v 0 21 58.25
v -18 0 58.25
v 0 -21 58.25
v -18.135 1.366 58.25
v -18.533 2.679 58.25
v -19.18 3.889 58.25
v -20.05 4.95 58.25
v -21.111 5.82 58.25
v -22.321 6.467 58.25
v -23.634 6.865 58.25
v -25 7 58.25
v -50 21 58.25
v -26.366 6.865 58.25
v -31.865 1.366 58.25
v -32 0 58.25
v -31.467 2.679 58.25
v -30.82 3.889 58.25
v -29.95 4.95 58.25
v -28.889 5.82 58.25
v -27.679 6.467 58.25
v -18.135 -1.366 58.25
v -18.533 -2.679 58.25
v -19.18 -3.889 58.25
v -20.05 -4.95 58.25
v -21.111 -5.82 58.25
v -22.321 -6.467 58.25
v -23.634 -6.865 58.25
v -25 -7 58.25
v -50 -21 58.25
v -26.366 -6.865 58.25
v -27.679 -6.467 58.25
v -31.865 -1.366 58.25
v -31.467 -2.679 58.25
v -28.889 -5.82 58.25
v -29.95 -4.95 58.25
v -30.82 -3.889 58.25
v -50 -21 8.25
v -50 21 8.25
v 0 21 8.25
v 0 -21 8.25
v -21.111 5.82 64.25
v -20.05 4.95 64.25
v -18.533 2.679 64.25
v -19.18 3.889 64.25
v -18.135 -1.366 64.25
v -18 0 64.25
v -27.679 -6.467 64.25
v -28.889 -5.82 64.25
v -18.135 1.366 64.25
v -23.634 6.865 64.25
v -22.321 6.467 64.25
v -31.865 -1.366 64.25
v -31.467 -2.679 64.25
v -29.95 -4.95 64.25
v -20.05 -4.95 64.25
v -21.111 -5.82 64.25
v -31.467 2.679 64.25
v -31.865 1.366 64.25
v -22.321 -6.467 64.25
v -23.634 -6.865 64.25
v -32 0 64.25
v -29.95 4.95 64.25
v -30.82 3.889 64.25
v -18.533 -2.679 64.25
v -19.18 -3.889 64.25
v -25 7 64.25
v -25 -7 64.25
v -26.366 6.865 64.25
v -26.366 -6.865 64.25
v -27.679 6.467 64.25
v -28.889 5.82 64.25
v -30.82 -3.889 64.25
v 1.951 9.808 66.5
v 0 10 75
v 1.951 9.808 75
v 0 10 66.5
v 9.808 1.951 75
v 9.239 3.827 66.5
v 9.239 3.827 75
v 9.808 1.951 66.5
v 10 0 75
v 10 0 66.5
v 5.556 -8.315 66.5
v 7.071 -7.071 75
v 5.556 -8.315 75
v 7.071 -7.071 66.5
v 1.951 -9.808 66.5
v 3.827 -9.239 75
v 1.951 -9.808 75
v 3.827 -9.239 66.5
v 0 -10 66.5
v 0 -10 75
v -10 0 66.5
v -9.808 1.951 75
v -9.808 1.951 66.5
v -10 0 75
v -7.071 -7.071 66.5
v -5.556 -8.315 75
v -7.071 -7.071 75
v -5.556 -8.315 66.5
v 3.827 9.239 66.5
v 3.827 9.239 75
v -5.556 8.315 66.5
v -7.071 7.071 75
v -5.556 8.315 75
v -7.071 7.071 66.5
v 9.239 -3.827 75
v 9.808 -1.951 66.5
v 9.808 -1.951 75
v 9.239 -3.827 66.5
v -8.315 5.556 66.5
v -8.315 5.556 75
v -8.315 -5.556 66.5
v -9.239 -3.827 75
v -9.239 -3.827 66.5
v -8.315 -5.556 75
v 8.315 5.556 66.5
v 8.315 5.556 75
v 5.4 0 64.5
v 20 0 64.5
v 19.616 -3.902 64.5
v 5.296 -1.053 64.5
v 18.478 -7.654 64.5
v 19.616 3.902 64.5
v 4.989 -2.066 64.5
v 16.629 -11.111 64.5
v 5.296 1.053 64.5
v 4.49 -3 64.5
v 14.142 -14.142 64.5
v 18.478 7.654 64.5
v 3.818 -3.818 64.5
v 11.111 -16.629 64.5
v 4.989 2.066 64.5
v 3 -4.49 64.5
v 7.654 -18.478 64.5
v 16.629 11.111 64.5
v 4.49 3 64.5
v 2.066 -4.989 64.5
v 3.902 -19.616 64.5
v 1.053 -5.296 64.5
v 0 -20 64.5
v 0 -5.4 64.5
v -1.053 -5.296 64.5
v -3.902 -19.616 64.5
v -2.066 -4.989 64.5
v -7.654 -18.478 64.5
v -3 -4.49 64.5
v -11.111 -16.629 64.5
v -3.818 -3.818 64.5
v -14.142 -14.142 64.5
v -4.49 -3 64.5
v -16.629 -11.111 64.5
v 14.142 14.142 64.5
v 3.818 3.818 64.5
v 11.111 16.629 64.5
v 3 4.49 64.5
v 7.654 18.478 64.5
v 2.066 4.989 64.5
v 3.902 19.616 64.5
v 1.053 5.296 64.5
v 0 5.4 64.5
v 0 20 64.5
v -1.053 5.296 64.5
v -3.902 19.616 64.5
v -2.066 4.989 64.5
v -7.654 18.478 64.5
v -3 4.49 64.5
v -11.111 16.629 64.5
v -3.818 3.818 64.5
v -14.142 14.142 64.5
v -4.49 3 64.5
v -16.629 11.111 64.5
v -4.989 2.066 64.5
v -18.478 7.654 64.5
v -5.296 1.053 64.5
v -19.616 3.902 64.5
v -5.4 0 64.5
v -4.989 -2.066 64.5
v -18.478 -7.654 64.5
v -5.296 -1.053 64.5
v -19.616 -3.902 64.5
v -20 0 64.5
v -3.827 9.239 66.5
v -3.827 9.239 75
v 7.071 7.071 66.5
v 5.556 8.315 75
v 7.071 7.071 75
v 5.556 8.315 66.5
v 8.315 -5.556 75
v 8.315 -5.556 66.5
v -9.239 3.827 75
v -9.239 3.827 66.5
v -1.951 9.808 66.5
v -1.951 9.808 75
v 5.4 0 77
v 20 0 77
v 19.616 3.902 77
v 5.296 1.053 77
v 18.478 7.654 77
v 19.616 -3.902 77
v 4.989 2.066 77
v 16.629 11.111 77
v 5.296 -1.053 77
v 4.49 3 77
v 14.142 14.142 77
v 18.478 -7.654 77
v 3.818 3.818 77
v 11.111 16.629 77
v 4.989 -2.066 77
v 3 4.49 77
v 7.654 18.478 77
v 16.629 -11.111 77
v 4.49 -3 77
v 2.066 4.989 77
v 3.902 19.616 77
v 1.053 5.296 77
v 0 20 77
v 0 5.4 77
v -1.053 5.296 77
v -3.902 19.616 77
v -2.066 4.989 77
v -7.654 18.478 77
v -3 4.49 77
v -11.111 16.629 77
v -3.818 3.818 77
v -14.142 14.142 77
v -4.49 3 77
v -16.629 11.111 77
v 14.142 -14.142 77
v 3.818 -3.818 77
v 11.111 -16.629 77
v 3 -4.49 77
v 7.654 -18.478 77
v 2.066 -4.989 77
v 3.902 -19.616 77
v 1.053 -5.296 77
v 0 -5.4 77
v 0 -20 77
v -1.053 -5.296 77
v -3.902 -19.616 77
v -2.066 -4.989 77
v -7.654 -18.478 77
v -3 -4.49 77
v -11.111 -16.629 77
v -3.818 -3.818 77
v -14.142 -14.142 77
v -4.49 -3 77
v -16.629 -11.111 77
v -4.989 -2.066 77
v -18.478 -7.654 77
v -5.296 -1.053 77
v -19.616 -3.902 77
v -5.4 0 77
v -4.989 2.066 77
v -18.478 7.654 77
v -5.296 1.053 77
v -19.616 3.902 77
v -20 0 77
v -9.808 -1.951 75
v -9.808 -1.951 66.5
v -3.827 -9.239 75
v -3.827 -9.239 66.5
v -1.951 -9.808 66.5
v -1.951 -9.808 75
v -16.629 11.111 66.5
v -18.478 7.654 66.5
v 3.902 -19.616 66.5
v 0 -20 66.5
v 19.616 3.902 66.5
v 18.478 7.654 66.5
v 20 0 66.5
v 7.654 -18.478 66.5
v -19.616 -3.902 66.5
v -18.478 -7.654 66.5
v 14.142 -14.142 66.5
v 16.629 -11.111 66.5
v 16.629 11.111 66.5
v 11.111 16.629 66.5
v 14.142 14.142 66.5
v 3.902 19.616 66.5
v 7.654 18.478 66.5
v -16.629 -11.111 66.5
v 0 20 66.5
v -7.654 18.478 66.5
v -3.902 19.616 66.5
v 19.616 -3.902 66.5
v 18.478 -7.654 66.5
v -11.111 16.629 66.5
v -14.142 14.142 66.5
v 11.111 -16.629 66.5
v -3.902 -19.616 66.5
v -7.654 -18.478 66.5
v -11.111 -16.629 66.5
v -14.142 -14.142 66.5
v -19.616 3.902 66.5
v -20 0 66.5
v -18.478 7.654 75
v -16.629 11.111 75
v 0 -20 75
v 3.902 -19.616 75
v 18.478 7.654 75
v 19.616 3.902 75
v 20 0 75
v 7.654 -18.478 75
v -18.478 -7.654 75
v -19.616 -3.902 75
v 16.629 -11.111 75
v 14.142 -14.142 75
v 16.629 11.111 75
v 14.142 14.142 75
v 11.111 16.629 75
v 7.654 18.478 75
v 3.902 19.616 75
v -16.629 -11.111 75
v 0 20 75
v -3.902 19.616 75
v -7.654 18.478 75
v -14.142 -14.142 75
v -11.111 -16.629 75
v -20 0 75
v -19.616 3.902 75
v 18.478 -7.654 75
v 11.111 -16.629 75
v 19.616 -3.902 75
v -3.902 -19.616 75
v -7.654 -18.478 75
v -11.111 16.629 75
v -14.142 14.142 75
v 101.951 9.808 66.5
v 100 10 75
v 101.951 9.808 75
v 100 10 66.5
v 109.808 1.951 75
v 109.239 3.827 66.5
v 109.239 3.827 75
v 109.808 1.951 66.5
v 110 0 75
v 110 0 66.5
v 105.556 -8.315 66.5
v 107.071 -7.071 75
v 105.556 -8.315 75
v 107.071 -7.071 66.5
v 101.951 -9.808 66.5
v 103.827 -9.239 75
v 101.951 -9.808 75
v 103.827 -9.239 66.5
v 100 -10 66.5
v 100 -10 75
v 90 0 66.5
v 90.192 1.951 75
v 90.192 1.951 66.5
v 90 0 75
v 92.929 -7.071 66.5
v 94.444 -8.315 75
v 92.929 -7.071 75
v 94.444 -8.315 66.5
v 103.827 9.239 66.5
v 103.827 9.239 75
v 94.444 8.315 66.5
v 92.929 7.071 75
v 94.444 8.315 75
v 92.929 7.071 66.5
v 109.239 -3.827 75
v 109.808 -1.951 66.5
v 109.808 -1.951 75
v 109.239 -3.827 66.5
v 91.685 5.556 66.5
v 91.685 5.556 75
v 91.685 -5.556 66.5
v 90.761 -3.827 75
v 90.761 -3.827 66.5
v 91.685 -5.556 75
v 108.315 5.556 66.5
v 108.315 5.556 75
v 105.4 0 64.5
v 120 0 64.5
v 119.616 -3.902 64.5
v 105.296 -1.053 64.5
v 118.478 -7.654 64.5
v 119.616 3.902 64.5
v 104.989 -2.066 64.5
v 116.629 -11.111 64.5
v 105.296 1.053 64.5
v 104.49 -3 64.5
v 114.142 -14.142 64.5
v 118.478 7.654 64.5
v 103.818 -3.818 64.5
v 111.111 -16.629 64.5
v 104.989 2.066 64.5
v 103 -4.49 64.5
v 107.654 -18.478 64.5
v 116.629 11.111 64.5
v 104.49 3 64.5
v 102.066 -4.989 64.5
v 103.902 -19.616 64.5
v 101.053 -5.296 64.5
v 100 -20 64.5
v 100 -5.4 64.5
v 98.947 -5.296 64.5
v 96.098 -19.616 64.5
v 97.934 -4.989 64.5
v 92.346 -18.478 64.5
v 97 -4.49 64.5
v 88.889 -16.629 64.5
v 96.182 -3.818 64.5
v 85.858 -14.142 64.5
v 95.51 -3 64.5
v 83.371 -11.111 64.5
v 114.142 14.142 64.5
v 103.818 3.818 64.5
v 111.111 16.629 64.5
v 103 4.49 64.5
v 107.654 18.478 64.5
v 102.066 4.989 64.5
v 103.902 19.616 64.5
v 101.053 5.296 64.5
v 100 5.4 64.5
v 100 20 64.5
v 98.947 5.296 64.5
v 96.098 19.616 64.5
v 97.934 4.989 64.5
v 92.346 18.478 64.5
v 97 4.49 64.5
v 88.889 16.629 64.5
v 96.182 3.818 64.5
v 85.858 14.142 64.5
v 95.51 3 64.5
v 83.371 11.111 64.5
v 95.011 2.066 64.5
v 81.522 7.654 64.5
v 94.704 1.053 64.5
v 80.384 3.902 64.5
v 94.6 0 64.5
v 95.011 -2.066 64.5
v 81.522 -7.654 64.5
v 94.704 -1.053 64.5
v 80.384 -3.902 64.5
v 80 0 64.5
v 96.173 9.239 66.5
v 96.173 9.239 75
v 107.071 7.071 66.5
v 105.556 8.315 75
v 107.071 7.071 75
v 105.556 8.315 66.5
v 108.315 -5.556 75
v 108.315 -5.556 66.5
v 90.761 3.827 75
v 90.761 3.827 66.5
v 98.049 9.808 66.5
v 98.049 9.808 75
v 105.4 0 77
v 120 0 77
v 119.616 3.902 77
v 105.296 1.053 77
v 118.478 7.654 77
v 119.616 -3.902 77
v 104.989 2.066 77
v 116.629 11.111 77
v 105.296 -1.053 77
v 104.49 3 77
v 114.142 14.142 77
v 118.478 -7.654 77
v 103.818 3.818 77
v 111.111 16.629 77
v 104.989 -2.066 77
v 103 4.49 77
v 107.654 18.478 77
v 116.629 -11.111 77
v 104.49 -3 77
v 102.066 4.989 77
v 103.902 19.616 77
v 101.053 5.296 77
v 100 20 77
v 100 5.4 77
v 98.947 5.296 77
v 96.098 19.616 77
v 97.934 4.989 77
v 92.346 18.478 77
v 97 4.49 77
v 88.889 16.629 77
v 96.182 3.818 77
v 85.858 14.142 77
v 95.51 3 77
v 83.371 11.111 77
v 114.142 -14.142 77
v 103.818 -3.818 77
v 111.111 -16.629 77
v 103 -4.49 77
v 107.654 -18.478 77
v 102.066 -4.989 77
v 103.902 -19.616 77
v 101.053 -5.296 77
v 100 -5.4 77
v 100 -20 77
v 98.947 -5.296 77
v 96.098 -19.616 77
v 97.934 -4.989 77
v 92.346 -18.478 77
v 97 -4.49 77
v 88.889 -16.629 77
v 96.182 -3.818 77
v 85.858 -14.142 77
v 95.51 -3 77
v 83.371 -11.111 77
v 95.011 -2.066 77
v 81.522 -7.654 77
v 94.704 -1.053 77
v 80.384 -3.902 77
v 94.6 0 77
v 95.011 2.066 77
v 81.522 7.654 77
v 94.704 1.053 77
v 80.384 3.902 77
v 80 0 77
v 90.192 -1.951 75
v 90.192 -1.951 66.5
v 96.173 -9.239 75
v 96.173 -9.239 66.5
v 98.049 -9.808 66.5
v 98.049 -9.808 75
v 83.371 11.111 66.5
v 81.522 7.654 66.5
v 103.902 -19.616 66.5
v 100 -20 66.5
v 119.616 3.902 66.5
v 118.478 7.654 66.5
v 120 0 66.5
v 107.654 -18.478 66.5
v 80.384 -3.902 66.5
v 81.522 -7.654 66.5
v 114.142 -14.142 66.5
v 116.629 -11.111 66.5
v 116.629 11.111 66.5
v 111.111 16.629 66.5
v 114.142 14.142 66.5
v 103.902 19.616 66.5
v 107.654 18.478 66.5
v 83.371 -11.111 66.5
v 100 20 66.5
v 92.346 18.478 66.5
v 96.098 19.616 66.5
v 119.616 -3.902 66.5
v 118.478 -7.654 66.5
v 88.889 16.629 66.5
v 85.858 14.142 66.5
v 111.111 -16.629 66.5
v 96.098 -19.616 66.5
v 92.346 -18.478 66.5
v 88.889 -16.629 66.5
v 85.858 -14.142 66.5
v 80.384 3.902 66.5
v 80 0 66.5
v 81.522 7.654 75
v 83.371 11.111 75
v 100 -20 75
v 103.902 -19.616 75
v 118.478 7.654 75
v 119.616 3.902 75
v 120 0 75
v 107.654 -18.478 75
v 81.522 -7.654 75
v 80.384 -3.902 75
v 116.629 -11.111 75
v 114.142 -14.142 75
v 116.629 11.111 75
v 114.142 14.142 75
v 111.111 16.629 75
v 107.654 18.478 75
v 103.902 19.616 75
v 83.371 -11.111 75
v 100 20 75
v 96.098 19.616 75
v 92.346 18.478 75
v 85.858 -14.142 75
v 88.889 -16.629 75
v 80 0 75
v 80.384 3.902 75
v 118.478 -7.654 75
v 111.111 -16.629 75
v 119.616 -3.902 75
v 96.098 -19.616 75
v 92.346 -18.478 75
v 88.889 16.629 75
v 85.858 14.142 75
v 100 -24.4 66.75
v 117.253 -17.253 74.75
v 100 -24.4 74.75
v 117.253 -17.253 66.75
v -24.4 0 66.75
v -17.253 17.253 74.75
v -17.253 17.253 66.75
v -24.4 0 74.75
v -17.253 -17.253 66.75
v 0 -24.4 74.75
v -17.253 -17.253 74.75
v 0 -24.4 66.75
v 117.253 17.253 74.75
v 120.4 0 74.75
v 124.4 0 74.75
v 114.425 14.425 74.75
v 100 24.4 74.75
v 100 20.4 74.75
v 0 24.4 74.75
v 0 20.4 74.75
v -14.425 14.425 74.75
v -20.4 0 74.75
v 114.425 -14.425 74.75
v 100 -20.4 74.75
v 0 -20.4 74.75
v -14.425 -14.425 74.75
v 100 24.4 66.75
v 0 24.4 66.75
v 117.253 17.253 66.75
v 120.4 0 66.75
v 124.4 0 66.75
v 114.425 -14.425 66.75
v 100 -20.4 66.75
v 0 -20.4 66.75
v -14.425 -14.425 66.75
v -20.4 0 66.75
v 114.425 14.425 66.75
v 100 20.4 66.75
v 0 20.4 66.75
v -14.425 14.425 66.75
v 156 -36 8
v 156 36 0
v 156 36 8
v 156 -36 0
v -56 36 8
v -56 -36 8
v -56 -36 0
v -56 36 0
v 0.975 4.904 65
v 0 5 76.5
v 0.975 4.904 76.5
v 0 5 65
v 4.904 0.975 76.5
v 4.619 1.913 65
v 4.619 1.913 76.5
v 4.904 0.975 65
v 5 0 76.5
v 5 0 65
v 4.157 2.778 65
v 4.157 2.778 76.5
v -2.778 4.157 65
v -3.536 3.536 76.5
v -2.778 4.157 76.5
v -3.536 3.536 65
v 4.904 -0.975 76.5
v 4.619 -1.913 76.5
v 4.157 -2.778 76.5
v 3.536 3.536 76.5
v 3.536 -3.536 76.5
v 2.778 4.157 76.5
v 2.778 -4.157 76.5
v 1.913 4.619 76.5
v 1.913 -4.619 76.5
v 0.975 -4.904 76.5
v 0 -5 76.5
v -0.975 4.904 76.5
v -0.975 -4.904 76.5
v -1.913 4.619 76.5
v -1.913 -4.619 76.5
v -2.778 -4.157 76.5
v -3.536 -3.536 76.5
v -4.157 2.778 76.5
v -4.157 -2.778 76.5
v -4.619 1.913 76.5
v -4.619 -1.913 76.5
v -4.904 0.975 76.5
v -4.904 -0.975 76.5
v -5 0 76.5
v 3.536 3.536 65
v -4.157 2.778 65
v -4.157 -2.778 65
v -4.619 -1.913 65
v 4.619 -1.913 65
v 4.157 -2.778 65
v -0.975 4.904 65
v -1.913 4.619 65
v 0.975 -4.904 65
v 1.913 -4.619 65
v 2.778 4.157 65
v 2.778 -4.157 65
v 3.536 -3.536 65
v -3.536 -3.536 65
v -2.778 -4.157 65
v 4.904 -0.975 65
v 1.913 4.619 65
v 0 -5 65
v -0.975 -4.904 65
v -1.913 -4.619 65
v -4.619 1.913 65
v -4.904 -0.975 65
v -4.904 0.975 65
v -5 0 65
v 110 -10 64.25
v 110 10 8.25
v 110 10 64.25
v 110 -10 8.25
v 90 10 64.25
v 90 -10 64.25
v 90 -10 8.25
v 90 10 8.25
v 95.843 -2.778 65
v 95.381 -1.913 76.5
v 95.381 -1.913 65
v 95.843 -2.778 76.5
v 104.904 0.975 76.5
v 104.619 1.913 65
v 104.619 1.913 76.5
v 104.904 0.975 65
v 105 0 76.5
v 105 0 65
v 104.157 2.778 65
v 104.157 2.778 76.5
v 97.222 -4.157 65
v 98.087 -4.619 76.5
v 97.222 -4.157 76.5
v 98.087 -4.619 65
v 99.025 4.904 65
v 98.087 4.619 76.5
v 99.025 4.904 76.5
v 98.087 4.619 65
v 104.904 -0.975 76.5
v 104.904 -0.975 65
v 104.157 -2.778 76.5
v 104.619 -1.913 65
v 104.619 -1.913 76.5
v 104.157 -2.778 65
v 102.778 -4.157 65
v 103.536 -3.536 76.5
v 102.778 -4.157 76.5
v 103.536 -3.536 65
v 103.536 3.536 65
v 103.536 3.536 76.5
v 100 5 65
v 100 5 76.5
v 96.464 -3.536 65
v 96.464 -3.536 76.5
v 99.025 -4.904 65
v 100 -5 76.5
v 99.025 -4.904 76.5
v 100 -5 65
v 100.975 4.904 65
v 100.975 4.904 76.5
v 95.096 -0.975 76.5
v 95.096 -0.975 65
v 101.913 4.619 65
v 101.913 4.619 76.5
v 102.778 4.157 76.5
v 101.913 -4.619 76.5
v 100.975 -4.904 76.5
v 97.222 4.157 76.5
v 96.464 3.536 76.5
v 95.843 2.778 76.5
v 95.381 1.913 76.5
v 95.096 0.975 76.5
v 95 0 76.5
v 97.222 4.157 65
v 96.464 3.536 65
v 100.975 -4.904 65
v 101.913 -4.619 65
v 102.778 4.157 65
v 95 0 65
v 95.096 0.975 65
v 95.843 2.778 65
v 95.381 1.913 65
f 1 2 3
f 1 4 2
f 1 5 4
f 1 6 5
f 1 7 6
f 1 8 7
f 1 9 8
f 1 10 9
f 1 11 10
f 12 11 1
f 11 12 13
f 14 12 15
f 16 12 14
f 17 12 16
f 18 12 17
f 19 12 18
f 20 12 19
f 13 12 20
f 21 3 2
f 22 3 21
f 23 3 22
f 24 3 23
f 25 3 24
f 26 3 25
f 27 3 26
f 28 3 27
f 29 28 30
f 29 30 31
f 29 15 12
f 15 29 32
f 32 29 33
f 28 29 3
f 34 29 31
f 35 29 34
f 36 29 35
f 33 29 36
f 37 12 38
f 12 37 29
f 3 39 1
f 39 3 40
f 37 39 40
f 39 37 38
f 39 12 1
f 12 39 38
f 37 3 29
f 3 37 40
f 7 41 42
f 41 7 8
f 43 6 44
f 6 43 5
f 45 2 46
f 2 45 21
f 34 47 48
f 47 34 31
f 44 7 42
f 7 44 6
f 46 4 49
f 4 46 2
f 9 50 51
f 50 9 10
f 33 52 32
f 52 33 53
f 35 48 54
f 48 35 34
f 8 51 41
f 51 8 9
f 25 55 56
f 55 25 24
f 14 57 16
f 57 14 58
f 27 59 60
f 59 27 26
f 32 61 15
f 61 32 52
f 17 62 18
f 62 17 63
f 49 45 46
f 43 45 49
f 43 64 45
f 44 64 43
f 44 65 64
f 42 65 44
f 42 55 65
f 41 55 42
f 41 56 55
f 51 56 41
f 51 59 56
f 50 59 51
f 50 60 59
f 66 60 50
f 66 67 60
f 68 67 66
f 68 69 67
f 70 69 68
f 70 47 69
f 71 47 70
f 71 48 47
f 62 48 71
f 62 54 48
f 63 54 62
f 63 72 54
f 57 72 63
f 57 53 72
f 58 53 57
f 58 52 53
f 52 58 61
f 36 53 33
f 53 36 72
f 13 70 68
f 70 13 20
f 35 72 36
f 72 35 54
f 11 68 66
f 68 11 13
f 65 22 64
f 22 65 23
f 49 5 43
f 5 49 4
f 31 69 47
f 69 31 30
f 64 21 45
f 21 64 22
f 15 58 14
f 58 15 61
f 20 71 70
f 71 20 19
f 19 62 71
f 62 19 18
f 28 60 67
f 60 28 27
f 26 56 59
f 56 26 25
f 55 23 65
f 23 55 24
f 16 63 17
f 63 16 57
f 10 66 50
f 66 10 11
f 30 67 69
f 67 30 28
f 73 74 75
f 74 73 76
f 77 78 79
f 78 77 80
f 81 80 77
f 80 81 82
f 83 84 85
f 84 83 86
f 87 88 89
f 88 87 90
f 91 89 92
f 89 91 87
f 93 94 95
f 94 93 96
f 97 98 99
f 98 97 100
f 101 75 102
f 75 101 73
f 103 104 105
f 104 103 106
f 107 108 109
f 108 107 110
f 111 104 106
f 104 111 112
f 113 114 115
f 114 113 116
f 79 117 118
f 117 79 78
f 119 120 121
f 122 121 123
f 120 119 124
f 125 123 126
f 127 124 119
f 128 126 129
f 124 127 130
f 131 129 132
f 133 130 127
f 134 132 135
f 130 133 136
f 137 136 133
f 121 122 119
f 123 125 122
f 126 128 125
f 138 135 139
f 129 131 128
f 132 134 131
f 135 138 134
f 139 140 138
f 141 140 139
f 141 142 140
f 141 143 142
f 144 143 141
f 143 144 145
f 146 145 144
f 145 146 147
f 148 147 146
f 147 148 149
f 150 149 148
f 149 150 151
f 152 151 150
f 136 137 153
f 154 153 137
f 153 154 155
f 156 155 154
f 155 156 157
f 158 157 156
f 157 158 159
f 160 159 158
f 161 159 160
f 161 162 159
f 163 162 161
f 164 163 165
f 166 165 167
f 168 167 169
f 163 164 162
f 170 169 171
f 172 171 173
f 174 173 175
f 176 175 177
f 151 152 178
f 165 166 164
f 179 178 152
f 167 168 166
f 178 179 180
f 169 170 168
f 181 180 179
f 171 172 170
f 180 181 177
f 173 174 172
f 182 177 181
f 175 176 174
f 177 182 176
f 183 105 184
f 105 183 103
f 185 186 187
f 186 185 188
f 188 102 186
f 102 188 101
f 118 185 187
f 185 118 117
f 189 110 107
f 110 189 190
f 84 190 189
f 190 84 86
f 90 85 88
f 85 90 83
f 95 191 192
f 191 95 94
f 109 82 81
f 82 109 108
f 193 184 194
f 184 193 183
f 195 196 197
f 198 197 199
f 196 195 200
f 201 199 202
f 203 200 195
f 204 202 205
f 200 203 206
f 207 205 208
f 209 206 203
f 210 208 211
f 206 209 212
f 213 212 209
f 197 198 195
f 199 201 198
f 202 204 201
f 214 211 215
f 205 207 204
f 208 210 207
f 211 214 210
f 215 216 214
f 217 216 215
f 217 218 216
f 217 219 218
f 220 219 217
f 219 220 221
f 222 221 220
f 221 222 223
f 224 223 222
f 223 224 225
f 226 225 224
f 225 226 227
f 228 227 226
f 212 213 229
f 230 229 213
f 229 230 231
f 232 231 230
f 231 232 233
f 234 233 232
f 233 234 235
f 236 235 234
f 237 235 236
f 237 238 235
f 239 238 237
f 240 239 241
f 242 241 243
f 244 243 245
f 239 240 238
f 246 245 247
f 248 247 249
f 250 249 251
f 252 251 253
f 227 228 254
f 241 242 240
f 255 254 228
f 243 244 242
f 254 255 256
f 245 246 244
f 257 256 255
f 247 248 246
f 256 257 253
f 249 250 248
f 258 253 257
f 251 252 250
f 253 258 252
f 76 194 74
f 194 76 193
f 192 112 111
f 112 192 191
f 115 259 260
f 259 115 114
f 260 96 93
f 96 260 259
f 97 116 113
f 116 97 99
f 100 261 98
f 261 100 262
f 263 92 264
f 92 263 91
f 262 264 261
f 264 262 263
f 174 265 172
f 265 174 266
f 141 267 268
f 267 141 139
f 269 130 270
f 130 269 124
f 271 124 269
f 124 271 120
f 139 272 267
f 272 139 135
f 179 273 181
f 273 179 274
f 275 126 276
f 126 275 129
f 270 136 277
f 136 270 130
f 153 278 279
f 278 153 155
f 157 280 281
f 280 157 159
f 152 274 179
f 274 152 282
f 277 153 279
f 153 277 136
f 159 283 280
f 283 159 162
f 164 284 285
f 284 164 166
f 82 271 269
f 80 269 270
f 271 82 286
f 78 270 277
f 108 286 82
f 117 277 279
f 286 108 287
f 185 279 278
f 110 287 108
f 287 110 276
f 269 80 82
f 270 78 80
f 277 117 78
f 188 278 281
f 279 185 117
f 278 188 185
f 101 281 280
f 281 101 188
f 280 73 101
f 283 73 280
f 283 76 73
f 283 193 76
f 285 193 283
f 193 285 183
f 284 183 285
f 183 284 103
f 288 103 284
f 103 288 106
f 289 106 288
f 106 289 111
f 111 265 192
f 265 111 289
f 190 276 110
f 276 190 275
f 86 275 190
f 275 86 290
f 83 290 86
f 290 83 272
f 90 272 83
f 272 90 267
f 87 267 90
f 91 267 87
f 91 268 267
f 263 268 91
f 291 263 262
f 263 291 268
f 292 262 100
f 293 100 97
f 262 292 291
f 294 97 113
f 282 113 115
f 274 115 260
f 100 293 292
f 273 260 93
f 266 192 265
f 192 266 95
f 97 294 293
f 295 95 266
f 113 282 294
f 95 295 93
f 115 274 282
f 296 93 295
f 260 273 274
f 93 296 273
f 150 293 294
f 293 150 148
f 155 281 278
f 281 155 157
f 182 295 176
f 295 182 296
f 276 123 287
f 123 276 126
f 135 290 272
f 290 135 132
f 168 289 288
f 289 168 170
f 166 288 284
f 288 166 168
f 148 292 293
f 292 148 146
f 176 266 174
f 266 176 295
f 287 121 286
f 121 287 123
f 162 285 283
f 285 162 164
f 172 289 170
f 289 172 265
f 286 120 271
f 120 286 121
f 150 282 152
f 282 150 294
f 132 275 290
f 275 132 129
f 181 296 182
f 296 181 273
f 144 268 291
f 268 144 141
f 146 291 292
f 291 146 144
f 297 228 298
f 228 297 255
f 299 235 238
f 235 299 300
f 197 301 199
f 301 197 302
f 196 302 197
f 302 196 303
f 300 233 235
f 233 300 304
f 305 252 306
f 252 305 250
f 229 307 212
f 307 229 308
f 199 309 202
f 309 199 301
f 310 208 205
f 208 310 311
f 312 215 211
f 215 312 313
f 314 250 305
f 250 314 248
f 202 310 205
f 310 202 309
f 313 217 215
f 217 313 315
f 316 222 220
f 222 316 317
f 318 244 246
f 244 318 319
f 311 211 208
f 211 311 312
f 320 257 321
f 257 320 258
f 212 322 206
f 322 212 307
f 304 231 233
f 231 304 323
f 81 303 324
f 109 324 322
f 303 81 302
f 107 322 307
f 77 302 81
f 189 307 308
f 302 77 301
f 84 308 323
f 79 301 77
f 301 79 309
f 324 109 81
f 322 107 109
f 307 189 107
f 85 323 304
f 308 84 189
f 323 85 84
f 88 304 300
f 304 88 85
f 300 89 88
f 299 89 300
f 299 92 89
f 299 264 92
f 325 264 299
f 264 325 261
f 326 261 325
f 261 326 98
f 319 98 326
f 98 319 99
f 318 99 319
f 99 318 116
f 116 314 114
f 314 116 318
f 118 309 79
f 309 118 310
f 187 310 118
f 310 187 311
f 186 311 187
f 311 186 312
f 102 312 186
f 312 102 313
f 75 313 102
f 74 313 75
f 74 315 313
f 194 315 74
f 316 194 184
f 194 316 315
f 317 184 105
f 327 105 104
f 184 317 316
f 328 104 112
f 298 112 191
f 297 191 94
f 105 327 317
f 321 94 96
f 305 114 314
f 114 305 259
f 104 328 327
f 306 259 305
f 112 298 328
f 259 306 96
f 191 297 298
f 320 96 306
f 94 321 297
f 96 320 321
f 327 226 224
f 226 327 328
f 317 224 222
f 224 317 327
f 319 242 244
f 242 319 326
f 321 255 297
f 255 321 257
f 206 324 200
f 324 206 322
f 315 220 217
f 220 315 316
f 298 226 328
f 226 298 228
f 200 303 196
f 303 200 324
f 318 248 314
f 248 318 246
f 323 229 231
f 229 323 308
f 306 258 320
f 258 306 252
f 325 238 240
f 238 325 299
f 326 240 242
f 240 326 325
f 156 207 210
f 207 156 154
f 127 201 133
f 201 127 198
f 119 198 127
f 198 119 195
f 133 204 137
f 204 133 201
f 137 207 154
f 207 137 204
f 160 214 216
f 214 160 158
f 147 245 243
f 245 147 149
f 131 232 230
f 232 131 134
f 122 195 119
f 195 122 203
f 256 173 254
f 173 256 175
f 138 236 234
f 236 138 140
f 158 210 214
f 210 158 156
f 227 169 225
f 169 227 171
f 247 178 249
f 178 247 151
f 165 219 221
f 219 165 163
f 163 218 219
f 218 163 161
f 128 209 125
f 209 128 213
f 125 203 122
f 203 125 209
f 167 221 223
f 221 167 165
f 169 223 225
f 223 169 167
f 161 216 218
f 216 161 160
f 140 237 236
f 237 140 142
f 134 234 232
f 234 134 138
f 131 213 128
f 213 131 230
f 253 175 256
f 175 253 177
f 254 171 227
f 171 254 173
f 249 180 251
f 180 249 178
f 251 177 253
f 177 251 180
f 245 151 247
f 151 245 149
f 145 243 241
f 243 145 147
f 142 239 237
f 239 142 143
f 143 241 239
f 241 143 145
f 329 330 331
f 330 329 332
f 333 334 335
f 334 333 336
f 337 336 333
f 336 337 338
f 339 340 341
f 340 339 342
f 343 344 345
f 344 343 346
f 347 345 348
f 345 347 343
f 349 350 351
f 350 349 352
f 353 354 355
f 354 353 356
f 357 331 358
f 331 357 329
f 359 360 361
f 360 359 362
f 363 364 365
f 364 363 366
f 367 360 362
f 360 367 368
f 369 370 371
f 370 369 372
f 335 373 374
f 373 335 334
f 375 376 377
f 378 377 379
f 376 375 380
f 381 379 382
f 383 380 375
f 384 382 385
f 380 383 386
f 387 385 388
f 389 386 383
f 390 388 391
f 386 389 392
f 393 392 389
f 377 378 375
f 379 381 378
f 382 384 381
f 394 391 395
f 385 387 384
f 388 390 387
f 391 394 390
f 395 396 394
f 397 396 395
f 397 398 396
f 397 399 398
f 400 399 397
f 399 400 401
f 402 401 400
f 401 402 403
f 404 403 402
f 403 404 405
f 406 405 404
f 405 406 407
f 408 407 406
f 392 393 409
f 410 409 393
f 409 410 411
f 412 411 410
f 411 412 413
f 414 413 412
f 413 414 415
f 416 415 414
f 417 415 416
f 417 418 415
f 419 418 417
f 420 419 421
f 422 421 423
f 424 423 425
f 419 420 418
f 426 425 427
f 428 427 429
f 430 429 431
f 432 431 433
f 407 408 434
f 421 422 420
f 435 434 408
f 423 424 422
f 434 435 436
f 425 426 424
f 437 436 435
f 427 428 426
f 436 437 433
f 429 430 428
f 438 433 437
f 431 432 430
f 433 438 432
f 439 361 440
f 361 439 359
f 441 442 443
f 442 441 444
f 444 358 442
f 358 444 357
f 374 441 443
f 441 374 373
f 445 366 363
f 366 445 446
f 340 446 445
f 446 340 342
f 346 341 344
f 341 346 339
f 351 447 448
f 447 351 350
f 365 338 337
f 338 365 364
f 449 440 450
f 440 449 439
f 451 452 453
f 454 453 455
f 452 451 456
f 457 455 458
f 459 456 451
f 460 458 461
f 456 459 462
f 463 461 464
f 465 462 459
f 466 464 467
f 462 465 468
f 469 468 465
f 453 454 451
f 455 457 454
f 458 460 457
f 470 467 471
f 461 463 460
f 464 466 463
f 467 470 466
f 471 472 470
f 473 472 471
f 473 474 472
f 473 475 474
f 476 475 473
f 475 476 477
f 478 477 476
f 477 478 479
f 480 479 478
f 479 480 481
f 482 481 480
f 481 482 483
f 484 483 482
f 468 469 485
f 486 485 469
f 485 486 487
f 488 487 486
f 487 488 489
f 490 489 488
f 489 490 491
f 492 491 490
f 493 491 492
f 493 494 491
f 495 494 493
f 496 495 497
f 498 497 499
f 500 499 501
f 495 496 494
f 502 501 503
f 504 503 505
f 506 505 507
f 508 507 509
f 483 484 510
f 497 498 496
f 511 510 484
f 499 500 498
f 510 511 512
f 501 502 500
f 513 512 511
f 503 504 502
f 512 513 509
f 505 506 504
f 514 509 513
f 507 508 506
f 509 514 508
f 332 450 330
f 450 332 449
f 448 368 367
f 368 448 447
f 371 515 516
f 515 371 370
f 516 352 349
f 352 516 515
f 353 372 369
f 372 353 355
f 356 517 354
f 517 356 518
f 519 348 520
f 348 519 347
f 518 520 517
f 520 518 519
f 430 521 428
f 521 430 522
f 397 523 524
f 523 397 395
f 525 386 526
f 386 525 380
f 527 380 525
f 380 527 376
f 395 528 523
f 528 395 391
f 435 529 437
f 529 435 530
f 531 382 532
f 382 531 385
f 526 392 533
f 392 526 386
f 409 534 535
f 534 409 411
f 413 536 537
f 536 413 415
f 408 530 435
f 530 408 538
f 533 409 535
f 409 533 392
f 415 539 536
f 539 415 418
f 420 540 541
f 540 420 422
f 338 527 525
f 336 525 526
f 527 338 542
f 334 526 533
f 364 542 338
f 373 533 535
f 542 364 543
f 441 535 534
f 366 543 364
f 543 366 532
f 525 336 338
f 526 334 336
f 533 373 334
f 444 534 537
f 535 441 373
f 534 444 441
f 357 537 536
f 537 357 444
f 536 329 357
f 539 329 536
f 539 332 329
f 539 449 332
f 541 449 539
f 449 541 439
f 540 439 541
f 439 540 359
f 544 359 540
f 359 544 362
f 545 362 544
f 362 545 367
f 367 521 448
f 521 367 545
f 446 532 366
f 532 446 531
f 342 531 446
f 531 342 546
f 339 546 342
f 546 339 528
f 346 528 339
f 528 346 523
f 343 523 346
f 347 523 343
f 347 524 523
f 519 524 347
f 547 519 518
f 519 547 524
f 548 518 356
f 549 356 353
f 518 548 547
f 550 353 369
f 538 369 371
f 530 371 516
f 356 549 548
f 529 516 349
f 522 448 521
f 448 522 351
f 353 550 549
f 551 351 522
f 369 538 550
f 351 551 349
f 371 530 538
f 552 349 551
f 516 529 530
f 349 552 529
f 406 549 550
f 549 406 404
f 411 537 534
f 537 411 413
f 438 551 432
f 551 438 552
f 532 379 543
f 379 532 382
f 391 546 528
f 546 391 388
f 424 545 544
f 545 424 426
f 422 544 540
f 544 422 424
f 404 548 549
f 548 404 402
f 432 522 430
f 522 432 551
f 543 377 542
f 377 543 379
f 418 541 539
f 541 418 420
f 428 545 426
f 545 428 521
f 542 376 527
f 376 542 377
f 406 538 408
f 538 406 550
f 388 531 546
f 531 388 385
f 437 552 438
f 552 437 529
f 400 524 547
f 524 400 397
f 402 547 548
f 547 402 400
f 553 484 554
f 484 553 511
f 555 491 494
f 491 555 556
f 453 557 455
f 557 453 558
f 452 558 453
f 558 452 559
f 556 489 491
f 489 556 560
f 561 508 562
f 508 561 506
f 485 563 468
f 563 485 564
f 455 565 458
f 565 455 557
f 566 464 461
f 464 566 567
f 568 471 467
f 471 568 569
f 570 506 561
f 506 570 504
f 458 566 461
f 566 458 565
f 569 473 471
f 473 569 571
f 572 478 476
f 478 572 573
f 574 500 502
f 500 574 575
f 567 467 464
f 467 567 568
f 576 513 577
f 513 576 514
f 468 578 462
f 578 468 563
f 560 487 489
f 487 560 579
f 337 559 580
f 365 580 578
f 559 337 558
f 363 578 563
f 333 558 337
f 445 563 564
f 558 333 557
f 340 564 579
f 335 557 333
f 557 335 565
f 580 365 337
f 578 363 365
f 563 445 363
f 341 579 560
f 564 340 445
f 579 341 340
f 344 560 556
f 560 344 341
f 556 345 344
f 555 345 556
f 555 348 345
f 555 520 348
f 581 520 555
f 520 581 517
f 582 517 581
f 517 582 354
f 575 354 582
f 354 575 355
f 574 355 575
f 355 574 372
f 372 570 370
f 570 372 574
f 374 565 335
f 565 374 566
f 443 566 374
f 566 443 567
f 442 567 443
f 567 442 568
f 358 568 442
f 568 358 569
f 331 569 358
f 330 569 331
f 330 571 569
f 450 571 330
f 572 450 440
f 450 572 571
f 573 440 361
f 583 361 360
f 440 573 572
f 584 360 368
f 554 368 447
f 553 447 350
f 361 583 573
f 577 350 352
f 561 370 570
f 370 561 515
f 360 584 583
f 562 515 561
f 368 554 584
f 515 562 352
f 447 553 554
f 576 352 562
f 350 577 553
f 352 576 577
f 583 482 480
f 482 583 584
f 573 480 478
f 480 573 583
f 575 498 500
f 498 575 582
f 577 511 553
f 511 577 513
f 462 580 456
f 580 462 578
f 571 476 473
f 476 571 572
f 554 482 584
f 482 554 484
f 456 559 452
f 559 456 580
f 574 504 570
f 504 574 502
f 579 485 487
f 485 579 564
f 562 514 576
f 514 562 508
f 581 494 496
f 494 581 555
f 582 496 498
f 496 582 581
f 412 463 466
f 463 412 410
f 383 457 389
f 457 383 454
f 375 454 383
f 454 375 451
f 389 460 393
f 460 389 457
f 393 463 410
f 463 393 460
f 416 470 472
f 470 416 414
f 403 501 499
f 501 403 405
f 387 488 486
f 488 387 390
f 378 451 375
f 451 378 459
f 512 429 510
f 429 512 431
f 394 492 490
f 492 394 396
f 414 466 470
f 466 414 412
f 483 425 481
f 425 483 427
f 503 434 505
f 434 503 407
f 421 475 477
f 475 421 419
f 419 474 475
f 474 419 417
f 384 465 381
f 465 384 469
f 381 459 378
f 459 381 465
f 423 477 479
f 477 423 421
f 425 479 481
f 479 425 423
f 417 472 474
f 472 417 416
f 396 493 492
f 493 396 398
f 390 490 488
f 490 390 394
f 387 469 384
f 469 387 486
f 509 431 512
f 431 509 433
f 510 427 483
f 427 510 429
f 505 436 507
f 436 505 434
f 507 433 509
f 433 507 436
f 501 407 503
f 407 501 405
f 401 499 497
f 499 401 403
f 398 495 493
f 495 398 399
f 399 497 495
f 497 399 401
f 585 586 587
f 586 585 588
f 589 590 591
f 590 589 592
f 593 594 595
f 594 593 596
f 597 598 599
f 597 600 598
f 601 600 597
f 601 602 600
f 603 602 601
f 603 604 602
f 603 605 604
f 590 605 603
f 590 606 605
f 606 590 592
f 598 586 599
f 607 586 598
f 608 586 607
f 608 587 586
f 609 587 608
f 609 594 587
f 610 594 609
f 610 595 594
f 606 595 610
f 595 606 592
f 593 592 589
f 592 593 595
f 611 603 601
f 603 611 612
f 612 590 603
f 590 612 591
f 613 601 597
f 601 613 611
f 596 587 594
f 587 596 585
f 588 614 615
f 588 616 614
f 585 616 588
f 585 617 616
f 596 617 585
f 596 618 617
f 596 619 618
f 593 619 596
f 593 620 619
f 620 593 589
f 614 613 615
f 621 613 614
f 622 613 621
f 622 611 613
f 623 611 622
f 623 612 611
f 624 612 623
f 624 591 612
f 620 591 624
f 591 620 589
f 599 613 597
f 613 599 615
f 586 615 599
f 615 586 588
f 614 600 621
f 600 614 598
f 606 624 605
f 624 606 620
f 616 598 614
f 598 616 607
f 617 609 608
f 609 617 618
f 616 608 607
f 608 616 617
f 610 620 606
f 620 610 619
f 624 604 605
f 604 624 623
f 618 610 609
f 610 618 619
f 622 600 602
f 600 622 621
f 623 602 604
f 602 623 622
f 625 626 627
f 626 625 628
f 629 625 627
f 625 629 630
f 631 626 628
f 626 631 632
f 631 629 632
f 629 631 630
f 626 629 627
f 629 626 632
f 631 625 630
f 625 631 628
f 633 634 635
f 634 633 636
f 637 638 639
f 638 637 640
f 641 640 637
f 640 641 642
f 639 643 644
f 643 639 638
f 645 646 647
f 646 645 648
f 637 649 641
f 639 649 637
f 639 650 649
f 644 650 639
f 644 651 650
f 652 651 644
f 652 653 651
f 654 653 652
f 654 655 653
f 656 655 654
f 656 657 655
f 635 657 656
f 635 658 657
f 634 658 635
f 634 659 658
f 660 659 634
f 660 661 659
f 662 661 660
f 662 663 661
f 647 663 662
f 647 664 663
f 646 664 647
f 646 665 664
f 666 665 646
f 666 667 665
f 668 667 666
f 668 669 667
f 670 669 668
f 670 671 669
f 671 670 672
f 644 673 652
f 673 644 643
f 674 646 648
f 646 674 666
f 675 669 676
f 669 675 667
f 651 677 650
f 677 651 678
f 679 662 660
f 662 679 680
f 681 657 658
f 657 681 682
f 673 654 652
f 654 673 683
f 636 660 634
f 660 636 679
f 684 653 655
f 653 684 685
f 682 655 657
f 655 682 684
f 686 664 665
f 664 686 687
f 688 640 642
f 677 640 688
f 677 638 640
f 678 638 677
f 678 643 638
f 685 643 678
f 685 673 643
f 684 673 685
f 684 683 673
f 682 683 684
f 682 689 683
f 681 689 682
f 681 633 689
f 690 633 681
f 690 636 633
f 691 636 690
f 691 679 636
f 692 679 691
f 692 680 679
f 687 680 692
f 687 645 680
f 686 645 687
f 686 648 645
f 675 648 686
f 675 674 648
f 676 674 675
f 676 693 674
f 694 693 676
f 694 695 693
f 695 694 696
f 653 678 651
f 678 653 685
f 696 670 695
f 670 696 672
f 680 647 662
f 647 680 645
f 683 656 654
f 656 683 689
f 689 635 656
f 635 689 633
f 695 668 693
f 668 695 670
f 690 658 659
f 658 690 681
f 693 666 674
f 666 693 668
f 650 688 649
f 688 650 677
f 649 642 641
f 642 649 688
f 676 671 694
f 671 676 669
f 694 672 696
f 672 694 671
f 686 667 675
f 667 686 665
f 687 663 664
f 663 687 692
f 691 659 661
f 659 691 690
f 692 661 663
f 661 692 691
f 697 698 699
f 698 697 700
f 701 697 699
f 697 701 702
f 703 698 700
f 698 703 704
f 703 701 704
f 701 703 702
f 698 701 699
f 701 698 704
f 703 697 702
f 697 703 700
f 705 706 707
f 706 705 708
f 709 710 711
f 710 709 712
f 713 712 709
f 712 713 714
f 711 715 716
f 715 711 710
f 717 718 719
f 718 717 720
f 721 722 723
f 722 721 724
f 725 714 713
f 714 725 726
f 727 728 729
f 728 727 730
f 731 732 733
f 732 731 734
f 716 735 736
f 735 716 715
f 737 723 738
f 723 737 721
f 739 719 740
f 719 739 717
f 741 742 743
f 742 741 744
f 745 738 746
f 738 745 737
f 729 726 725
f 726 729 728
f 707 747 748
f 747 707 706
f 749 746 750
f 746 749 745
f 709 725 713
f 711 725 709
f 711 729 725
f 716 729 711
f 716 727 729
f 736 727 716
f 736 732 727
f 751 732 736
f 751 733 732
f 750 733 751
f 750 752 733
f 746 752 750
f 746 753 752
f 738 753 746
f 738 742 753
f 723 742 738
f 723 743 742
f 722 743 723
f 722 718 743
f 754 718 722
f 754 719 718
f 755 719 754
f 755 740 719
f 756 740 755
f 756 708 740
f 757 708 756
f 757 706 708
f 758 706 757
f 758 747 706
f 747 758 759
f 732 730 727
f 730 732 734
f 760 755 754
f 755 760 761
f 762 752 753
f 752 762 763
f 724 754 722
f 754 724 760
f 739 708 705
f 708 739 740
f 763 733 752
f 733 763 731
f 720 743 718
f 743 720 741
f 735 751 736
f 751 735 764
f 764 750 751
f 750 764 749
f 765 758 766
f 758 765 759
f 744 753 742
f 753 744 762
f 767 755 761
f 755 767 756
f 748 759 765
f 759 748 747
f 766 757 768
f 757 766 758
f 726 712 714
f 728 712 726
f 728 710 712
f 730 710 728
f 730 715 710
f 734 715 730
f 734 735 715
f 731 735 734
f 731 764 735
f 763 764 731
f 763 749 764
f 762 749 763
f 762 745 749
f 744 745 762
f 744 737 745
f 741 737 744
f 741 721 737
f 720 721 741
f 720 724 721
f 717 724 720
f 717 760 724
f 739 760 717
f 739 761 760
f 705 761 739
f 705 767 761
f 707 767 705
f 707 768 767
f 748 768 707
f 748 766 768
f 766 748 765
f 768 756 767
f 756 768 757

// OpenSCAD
$fn = 32;

// ------------------------------------------------------------------------
// Motor belt drive: span 100 mm, pulleys d40, belt 8 mm wide
// Every part is its own module, assembly() places every instance.
// ------------------------------------------------------------------------

// --- part 1 ---
module base_plate() {
  difference() {
    translate([-106, -36, 0]) cube([212, 72, 8]);
  }
}

// --- part 2 ---
module motor() {
  union() {
    translate([-25, -21, 0]) cube([50, 42, 50]);
    translate([28, 0, 25]) rotate([0, 90, 0]) cylinder(h = 6, d = 14, center = true);
  }
}

// --- part 3 ---
module drive_shaft() {
  translate([0, 0, -5.75]) cylinder(h = 11.5, d = 10);
}

// --- part 4 ---
module pulley_drive() {
  difference() {
    union() {
      cylinder(h = 12.5, d = 20);
      cylinder(h = 2, d = 40);
      translate([0, 0, 10.5]) cylinder(h = 2, d = 40);
    }
    translate([0, 0, -1]) cylinder(h = 14.5, d = 10.8);
  }
}

// --- part 5 ---
module idler_post() {
  translate([-10, -10, 0]) cube([20, 20, 56]);
}

// --- part 6 ---
module driven_shaft() {
  translate([0, 0, -5.75]) cylinder(h = 11.5, d = 10);
}

// --- part 7 ---
module pulley_driven() {
  difference() {
    union() {
      cylinder(h = 12.5, d = 20);
      cylinder(h = 2, d = 40);
      translate([0, 0, 10.5]) cylinder(h = 2, d = 40);
    }
    translate([0, 0, -1]) cylinder(h = 14.5, d = 10.8);
  }
}

// --- part 8 ---
module drive_belt() {
  difference() {
    linear_extrude(height = 8) polygon(points = concat([for (a = [90 : 45 : 270]) [24.4 * cos(a), 24.4 * sin(a)]], [for (a = [270 : 45 : 450]) [100 + 24.4 * cos(a), 24.4 * sin(a)]]));
    translate([0, 0, -1]) linear_extrude(height = 10) polygon(points = concat([for (a = [90 : 45 : 270]) [20.4 * cos(a), 20.4 * sin(a)]], [for (a = [270 : 45 : 450]) [100 + 20.4 * cos(a), 20.4 * sin(a)]]));
  }
}

// --- assembly ---
module assembly() {
  color([0.80, 0.24, 0.20]) translate([50, 0, 0]) rotate([0, 0, 0]) base_plate();
  color([0.20, 0.45, 0.75]) translate([0, 0, 33.25]) rotate([0, 270, 0]) motor();
  color([0.25, 0.62, 0.32]) translate([0, 0, 70.75]) rotate([0, 0, 0]) drive_shaft();
  color([0.92, 0.70, 0.18]) translate([0, 0, 64.5]) rotate([0, 0, 0]) pulley_drive();
  color([0.58, 0.35, 0.70]) translate([100, 0, 8.25]) rotate([0, 0, 0]) idler_post();
  color([0.16, 0.66, 0.66]) translate([100, 0, 70.75]) rotate([0, 0, 0]) driven_shaft();
  color([0.85, 0.48, 0.18]) translate([100, 0, 64.5]) rotate([0, 0, 0]) pulley_driven();
  color([0.55, 0.60, 0.65]) translate([0, 0, 66.75]) rotate([0, 0, 0]) drive_belt();
}

assembly();
